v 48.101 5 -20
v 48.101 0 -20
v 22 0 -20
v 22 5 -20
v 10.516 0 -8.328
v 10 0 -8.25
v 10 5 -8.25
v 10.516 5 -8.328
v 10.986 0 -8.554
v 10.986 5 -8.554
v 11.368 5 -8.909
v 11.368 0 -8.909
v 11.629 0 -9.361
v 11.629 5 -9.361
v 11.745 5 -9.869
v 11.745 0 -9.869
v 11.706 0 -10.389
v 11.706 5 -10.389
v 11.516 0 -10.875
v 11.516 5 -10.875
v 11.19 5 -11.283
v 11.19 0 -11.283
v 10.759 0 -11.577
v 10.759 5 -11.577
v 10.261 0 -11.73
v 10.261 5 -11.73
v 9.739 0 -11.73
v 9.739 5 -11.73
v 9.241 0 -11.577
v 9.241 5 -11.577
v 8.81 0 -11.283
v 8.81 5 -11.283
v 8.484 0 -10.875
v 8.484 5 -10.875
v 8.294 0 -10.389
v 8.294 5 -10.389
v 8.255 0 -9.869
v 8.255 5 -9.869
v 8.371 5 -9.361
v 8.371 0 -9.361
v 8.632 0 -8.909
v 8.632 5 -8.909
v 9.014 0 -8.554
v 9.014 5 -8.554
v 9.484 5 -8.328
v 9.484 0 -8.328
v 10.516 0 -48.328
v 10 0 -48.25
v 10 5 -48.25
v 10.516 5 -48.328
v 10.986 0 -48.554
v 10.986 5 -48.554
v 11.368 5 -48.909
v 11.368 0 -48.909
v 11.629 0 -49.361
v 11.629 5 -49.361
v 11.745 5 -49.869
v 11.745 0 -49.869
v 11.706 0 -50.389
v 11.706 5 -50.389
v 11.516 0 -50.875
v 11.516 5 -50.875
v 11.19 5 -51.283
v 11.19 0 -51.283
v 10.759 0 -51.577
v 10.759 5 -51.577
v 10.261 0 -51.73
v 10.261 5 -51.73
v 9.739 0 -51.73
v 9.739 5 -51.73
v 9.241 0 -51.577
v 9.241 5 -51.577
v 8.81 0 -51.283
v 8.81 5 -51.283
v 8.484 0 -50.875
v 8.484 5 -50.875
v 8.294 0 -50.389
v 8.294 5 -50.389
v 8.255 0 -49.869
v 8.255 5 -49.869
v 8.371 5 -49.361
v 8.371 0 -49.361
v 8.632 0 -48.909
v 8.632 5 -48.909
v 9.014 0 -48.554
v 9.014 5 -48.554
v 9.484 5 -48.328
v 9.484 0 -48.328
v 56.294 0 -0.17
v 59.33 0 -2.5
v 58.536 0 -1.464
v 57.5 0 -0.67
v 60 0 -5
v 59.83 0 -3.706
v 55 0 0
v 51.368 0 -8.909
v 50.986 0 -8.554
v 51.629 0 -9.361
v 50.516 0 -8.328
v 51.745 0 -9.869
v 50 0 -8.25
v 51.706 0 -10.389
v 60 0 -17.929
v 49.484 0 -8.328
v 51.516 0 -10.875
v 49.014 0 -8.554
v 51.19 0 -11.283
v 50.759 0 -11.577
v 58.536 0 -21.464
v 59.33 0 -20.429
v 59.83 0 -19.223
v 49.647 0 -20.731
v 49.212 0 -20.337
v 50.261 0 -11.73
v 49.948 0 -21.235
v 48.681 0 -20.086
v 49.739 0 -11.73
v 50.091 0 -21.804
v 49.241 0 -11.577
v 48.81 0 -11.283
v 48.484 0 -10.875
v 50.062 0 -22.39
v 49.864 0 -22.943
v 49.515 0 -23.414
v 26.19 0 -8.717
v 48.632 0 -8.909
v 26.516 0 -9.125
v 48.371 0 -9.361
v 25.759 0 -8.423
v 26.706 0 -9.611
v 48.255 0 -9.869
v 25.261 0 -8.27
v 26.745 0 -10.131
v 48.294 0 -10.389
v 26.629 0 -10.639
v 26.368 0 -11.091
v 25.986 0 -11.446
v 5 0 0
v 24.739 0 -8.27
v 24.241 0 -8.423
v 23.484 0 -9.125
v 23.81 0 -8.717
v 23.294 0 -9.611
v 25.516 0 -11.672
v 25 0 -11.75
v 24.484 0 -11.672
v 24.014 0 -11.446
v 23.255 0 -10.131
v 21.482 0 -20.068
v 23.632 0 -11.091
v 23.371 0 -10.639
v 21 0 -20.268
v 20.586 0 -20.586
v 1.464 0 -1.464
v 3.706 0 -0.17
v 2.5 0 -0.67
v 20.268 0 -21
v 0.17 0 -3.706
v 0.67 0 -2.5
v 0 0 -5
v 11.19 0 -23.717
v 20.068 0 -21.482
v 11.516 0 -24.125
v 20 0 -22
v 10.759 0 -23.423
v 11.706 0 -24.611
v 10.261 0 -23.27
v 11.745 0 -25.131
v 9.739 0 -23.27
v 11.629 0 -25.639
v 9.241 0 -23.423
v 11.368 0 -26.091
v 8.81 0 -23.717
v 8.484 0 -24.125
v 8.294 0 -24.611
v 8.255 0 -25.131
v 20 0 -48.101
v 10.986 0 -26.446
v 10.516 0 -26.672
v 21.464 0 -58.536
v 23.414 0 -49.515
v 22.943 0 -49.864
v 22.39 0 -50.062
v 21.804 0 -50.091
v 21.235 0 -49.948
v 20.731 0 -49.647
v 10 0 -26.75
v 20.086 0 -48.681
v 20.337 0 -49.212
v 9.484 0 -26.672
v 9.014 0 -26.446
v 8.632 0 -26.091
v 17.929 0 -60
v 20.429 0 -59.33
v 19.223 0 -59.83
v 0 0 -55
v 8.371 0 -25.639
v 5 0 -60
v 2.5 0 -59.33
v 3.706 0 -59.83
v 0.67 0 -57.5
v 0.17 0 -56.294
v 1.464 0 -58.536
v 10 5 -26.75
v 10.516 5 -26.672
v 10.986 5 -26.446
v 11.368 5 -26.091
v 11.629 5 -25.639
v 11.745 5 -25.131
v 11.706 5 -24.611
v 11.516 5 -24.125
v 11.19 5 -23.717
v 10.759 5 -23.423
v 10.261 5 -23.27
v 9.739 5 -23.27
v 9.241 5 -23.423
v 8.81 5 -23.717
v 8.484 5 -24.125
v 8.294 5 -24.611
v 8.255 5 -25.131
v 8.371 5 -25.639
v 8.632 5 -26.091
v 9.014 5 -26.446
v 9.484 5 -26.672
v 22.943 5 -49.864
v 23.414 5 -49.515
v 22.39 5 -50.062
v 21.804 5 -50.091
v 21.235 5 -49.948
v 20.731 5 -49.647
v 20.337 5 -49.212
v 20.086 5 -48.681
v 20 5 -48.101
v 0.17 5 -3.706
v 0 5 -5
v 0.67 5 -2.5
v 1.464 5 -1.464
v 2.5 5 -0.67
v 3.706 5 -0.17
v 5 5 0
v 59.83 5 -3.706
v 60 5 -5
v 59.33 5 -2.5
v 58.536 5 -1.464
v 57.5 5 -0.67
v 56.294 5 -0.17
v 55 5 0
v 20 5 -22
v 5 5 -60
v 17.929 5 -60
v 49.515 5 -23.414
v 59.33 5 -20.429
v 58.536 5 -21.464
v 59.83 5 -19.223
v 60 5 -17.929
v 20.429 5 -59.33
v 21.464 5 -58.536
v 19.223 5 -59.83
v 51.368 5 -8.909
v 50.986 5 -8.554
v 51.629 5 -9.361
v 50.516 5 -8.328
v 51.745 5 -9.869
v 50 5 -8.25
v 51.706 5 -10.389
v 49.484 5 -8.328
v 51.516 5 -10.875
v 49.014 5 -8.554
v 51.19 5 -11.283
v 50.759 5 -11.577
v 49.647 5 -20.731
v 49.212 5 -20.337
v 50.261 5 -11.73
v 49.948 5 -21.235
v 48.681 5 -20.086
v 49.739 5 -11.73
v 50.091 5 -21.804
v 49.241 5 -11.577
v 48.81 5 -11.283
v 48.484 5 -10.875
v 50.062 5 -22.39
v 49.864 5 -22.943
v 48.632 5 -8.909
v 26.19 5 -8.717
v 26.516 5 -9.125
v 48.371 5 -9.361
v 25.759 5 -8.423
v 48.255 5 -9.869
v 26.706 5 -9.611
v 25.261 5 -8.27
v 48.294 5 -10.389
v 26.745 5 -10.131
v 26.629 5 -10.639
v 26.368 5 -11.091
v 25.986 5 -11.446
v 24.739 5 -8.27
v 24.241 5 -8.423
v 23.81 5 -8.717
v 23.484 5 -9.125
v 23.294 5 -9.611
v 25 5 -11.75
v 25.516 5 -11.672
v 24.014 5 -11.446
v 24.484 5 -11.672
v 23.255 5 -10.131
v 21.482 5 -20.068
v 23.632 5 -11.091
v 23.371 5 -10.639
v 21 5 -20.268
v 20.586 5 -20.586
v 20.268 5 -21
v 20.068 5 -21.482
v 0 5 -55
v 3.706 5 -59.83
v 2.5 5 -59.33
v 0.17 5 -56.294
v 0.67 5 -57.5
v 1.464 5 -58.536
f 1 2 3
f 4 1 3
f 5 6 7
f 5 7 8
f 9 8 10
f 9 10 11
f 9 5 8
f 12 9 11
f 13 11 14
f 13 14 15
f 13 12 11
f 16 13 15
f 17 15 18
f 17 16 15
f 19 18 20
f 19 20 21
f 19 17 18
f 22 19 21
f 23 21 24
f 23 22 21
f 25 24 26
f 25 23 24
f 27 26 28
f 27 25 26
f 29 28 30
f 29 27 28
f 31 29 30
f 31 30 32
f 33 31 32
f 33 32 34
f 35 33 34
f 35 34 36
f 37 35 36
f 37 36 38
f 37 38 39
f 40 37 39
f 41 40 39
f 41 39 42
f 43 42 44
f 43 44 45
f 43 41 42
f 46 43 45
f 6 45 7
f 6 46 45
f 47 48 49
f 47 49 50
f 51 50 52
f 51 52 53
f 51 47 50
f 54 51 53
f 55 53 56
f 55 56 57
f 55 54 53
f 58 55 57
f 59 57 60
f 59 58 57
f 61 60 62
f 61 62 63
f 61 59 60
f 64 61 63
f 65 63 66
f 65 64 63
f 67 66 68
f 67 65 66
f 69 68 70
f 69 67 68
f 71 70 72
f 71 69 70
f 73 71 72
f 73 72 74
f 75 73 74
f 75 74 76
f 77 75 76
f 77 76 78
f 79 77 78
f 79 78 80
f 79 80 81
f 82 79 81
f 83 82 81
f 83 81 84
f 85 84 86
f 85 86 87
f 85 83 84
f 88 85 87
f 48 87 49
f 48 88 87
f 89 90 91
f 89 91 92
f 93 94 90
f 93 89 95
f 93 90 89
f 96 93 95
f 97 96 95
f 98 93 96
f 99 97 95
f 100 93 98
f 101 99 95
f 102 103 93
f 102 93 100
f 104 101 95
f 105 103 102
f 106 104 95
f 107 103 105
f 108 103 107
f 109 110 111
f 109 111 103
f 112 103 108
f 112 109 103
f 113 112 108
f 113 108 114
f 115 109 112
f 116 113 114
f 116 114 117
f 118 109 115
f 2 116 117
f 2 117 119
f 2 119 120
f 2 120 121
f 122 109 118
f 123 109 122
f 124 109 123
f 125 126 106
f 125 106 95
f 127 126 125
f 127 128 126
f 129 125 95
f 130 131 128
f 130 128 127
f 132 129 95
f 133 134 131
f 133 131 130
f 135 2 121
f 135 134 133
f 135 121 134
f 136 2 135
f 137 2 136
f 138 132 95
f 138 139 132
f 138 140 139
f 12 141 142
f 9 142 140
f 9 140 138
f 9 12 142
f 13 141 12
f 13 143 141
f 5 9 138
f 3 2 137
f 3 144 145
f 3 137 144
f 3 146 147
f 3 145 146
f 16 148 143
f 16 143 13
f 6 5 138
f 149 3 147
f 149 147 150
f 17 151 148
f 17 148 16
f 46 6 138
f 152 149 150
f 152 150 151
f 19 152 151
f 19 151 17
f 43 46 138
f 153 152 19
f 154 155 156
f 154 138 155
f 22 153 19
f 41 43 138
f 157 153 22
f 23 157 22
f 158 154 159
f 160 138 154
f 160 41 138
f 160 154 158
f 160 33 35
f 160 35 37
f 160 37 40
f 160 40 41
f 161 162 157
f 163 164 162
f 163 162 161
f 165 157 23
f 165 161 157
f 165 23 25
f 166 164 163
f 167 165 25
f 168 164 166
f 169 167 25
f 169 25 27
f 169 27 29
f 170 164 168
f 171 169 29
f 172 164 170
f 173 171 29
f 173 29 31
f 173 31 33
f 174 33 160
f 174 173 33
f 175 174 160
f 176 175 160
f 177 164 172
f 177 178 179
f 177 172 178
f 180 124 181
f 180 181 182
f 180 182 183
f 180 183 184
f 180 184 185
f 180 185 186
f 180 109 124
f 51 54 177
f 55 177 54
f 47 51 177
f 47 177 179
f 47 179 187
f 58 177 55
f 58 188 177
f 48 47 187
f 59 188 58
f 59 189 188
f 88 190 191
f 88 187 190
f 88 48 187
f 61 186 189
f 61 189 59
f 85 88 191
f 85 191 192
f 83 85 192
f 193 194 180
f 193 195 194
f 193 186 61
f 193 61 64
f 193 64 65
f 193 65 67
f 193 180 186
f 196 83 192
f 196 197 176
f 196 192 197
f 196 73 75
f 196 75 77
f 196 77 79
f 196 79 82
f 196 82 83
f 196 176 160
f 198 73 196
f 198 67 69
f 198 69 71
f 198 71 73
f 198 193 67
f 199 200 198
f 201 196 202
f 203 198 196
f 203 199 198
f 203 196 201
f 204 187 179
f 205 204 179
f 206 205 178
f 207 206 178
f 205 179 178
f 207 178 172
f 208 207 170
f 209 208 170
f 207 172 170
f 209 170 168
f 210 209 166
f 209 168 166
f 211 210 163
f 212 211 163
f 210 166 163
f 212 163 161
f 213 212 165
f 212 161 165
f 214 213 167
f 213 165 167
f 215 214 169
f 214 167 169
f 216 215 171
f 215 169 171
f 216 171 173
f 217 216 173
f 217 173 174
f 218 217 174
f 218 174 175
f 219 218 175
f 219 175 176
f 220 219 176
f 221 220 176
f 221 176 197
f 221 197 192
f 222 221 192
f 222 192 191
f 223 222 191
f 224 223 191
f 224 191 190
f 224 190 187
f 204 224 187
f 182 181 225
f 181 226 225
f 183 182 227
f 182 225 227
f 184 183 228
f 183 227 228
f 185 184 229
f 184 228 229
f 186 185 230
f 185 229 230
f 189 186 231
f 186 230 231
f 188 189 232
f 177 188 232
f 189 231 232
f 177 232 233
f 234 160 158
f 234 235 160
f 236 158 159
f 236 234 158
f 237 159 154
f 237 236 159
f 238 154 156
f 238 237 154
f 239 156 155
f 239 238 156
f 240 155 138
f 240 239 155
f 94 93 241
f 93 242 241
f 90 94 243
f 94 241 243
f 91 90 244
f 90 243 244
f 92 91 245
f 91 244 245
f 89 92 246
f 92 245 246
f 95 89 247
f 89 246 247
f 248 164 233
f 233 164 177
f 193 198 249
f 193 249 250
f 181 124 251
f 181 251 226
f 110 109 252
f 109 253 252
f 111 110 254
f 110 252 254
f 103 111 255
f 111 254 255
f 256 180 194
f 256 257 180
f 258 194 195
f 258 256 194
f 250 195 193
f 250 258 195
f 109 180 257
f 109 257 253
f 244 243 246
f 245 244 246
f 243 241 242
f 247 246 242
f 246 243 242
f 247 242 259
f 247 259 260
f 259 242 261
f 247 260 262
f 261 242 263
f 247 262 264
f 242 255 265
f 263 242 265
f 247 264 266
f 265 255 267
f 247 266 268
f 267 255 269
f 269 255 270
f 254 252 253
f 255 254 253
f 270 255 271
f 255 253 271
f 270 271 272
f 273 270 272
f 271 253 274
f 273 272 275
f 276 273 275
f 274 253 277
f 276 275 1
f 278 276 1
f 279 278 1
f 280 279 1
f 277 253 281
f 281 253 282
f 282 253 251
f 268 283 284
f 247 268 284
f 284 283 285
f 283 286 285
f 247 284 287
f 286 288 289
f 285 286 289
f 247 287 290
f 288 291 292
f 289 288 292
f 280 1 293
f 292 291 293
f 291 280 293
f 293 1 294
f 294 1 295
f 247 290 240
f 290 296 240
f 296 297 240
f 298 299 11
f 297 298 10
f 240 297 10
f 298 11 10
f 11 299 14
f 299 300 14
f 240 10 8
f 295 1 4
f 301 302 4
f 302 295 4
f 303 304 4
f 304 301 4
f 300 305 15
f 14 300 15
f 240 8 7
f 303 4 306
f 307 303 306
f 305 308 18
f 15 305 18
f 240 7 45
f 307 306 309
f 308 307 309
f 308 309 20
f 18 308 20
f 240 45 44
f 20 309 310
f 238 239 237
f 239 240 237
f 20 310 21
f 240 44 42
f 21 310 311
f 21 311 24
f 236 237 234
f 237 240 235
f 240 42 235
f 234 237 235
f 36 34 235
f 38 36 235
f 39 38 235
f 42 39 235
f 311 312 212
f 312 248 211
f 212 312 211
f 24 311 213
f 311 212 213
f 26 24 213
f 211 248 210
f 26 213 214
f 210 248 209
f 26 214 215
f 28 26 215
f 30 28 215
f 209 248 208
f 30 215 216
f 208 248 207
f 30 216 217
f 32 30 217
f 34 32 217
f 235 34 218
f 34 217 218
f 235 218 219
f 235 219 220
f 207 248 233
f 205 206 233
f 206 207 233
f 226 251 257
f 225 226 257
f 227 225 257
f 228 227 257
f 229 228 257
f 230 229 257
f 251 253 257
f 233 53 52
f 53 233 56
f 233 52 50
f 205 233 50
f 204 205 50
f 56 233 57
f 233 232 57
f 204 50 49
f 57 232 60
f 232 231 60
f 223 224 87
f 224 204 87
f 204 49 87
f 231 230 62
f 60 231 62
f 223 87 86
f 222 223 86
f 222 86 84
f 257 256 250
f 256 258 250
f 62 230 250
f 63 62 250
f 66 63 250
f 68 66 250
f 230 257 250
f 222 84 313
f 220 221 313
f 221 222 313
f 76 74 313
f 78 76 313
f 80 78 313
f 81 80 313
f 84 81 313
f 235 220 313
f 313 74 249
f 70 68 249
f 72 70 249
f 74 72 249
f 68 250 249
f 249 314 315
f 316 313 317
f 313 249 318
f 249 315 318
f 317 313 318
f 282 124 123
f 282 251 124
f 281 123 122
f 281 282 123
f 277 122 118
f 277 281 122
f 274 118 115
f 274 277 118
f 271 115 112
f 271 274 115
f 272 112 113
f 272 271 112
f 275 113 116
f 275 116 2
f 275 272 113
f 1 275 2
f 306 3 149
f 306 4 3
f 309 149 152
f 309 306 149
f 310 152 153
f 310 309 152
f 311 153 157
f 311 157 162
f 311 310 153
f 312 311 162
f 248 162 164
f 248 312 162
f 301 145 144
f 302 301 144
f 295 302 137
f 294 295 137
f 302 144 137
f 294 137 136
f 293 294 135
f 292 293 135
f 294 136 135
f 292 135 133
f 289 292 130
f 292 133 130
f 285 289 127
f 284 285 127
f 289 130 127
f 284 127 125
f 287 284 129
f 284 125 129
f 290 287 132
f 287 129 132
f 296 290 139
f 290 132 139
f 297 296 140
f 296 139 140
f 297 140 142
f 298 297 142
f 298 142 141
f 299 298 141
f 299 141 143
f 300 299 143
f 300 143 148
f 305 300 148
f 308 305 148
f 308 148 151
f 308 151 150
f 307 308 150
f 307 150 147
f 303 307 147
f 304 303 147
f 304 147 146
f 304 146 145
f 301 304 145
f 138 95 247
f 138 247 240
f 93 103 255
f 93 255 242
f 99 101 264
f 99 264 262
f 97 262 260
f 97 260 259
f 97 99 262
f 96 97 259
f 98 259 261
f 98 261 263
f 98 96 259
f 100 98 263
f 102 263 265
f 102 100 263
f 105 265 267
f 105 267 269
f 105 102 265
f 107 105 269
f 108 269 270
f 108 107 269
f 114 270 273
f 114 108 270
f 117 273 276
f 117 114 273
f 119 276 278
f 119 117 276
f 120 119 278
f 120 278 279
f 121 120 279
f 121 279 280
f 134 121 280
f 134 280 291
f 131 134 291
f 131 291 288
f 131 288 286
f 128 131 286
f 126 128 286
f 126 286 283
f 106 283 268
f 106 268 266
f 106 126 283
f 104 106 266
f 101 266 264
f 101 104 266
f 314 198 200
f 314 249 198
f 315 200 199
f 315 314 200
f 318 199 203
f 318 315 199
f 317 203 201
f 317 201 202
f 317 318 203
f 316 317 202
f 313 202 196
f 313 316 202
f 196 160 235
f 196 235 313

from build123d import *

# Parameters (mm, degrees)
ESBO_O1_R                = 1.75
RESSALTO_EXTRUS_O1_DEPTH = 5
FILETE2_R                = 2
ESBO_O4_R                = 1.75
CORTE_EXTRUS_O1_DEPTH    = 10
FILETE3_R                = 5


with BuildPart() as part:
    # Esboço1 → Ressalto-extrusão1 (new body)
    # profile 1 of 2: a face of its own
    with BuildSketch(Plane(origin=(0, 0, 0), x_dir=(1, 0, 0), z_dir=(0, 1, 0))):
        Polygon((52.928932188, 20), (60, 20), (60, 0), (0, 0), (0, 60), (20, 60), (20, 52.928932188), (20, 20), align=None)
        with Locations(Location((10, 10, 0), (0, 0, 270))):
            Circle(ESBO_O1_R, mode=Mode.SUBTRACT)
        with Locations(Location((50, 10, 0), (0, 0, 270))):
            Circle(ESBO_O1_R, mode=Mode.SUBTRACT)
        with Locations(Location((10, 50, 0), (0, 0, 270))):
            Circle(ESBO_O1_R, mode=Mode.SUBTRACT)
    # profile 2 of 2: a face of its own
    with BuildSketch(Plane(origin=(0, 0, 0), x_dir=(1, 0, 0), z_dir=(0, 1, 0))):
        Polygon((52.928932188, 20), (20, 52.928932188), (20, 60), (60, 20), align=None)
    extrude(amount=RESSALTO_EXTRUS_O1_DEPTH)

    # Filete2
    filete2_edges = [part.edges().sort_by_distance(p)[0] for p in [
        (52.928932188, 2.5, -20),
        (20, 2.5, -52.928932188),
        (20, 2.5, -20),
    ]]
    fillet(filete2_edges, radius=FILETE2_R)

    # Esboço4 → Corte-extrusão1 (cut)
    with BuildSketch(Plane.XZ):
        with Locations(Location((10, -25, 0), (0, 0, 270))):
            Circle(ESBO_O4_R)
        with Locations(Location((25, -10, 0), (0, 0, 270))):
            Circle(ESBO_O4_R)
    extrude(amount=-CORTE_EXTRUS_O1_DEPTH, mode=Mode.SUBTRACT)

    # Filete3
    filete3_edges = [part.edges().sort_by_distance(p)[0] for p in [
        (60, 2.5, 0),
        (0, 2.5, 0),
        (0, 2.5, -60),
        (20, 2.5, -60),
        (60, 2.5, -20),
    ]]
    fillet(filete3_edges, radius=FILETE3_R)


solid = part.part
